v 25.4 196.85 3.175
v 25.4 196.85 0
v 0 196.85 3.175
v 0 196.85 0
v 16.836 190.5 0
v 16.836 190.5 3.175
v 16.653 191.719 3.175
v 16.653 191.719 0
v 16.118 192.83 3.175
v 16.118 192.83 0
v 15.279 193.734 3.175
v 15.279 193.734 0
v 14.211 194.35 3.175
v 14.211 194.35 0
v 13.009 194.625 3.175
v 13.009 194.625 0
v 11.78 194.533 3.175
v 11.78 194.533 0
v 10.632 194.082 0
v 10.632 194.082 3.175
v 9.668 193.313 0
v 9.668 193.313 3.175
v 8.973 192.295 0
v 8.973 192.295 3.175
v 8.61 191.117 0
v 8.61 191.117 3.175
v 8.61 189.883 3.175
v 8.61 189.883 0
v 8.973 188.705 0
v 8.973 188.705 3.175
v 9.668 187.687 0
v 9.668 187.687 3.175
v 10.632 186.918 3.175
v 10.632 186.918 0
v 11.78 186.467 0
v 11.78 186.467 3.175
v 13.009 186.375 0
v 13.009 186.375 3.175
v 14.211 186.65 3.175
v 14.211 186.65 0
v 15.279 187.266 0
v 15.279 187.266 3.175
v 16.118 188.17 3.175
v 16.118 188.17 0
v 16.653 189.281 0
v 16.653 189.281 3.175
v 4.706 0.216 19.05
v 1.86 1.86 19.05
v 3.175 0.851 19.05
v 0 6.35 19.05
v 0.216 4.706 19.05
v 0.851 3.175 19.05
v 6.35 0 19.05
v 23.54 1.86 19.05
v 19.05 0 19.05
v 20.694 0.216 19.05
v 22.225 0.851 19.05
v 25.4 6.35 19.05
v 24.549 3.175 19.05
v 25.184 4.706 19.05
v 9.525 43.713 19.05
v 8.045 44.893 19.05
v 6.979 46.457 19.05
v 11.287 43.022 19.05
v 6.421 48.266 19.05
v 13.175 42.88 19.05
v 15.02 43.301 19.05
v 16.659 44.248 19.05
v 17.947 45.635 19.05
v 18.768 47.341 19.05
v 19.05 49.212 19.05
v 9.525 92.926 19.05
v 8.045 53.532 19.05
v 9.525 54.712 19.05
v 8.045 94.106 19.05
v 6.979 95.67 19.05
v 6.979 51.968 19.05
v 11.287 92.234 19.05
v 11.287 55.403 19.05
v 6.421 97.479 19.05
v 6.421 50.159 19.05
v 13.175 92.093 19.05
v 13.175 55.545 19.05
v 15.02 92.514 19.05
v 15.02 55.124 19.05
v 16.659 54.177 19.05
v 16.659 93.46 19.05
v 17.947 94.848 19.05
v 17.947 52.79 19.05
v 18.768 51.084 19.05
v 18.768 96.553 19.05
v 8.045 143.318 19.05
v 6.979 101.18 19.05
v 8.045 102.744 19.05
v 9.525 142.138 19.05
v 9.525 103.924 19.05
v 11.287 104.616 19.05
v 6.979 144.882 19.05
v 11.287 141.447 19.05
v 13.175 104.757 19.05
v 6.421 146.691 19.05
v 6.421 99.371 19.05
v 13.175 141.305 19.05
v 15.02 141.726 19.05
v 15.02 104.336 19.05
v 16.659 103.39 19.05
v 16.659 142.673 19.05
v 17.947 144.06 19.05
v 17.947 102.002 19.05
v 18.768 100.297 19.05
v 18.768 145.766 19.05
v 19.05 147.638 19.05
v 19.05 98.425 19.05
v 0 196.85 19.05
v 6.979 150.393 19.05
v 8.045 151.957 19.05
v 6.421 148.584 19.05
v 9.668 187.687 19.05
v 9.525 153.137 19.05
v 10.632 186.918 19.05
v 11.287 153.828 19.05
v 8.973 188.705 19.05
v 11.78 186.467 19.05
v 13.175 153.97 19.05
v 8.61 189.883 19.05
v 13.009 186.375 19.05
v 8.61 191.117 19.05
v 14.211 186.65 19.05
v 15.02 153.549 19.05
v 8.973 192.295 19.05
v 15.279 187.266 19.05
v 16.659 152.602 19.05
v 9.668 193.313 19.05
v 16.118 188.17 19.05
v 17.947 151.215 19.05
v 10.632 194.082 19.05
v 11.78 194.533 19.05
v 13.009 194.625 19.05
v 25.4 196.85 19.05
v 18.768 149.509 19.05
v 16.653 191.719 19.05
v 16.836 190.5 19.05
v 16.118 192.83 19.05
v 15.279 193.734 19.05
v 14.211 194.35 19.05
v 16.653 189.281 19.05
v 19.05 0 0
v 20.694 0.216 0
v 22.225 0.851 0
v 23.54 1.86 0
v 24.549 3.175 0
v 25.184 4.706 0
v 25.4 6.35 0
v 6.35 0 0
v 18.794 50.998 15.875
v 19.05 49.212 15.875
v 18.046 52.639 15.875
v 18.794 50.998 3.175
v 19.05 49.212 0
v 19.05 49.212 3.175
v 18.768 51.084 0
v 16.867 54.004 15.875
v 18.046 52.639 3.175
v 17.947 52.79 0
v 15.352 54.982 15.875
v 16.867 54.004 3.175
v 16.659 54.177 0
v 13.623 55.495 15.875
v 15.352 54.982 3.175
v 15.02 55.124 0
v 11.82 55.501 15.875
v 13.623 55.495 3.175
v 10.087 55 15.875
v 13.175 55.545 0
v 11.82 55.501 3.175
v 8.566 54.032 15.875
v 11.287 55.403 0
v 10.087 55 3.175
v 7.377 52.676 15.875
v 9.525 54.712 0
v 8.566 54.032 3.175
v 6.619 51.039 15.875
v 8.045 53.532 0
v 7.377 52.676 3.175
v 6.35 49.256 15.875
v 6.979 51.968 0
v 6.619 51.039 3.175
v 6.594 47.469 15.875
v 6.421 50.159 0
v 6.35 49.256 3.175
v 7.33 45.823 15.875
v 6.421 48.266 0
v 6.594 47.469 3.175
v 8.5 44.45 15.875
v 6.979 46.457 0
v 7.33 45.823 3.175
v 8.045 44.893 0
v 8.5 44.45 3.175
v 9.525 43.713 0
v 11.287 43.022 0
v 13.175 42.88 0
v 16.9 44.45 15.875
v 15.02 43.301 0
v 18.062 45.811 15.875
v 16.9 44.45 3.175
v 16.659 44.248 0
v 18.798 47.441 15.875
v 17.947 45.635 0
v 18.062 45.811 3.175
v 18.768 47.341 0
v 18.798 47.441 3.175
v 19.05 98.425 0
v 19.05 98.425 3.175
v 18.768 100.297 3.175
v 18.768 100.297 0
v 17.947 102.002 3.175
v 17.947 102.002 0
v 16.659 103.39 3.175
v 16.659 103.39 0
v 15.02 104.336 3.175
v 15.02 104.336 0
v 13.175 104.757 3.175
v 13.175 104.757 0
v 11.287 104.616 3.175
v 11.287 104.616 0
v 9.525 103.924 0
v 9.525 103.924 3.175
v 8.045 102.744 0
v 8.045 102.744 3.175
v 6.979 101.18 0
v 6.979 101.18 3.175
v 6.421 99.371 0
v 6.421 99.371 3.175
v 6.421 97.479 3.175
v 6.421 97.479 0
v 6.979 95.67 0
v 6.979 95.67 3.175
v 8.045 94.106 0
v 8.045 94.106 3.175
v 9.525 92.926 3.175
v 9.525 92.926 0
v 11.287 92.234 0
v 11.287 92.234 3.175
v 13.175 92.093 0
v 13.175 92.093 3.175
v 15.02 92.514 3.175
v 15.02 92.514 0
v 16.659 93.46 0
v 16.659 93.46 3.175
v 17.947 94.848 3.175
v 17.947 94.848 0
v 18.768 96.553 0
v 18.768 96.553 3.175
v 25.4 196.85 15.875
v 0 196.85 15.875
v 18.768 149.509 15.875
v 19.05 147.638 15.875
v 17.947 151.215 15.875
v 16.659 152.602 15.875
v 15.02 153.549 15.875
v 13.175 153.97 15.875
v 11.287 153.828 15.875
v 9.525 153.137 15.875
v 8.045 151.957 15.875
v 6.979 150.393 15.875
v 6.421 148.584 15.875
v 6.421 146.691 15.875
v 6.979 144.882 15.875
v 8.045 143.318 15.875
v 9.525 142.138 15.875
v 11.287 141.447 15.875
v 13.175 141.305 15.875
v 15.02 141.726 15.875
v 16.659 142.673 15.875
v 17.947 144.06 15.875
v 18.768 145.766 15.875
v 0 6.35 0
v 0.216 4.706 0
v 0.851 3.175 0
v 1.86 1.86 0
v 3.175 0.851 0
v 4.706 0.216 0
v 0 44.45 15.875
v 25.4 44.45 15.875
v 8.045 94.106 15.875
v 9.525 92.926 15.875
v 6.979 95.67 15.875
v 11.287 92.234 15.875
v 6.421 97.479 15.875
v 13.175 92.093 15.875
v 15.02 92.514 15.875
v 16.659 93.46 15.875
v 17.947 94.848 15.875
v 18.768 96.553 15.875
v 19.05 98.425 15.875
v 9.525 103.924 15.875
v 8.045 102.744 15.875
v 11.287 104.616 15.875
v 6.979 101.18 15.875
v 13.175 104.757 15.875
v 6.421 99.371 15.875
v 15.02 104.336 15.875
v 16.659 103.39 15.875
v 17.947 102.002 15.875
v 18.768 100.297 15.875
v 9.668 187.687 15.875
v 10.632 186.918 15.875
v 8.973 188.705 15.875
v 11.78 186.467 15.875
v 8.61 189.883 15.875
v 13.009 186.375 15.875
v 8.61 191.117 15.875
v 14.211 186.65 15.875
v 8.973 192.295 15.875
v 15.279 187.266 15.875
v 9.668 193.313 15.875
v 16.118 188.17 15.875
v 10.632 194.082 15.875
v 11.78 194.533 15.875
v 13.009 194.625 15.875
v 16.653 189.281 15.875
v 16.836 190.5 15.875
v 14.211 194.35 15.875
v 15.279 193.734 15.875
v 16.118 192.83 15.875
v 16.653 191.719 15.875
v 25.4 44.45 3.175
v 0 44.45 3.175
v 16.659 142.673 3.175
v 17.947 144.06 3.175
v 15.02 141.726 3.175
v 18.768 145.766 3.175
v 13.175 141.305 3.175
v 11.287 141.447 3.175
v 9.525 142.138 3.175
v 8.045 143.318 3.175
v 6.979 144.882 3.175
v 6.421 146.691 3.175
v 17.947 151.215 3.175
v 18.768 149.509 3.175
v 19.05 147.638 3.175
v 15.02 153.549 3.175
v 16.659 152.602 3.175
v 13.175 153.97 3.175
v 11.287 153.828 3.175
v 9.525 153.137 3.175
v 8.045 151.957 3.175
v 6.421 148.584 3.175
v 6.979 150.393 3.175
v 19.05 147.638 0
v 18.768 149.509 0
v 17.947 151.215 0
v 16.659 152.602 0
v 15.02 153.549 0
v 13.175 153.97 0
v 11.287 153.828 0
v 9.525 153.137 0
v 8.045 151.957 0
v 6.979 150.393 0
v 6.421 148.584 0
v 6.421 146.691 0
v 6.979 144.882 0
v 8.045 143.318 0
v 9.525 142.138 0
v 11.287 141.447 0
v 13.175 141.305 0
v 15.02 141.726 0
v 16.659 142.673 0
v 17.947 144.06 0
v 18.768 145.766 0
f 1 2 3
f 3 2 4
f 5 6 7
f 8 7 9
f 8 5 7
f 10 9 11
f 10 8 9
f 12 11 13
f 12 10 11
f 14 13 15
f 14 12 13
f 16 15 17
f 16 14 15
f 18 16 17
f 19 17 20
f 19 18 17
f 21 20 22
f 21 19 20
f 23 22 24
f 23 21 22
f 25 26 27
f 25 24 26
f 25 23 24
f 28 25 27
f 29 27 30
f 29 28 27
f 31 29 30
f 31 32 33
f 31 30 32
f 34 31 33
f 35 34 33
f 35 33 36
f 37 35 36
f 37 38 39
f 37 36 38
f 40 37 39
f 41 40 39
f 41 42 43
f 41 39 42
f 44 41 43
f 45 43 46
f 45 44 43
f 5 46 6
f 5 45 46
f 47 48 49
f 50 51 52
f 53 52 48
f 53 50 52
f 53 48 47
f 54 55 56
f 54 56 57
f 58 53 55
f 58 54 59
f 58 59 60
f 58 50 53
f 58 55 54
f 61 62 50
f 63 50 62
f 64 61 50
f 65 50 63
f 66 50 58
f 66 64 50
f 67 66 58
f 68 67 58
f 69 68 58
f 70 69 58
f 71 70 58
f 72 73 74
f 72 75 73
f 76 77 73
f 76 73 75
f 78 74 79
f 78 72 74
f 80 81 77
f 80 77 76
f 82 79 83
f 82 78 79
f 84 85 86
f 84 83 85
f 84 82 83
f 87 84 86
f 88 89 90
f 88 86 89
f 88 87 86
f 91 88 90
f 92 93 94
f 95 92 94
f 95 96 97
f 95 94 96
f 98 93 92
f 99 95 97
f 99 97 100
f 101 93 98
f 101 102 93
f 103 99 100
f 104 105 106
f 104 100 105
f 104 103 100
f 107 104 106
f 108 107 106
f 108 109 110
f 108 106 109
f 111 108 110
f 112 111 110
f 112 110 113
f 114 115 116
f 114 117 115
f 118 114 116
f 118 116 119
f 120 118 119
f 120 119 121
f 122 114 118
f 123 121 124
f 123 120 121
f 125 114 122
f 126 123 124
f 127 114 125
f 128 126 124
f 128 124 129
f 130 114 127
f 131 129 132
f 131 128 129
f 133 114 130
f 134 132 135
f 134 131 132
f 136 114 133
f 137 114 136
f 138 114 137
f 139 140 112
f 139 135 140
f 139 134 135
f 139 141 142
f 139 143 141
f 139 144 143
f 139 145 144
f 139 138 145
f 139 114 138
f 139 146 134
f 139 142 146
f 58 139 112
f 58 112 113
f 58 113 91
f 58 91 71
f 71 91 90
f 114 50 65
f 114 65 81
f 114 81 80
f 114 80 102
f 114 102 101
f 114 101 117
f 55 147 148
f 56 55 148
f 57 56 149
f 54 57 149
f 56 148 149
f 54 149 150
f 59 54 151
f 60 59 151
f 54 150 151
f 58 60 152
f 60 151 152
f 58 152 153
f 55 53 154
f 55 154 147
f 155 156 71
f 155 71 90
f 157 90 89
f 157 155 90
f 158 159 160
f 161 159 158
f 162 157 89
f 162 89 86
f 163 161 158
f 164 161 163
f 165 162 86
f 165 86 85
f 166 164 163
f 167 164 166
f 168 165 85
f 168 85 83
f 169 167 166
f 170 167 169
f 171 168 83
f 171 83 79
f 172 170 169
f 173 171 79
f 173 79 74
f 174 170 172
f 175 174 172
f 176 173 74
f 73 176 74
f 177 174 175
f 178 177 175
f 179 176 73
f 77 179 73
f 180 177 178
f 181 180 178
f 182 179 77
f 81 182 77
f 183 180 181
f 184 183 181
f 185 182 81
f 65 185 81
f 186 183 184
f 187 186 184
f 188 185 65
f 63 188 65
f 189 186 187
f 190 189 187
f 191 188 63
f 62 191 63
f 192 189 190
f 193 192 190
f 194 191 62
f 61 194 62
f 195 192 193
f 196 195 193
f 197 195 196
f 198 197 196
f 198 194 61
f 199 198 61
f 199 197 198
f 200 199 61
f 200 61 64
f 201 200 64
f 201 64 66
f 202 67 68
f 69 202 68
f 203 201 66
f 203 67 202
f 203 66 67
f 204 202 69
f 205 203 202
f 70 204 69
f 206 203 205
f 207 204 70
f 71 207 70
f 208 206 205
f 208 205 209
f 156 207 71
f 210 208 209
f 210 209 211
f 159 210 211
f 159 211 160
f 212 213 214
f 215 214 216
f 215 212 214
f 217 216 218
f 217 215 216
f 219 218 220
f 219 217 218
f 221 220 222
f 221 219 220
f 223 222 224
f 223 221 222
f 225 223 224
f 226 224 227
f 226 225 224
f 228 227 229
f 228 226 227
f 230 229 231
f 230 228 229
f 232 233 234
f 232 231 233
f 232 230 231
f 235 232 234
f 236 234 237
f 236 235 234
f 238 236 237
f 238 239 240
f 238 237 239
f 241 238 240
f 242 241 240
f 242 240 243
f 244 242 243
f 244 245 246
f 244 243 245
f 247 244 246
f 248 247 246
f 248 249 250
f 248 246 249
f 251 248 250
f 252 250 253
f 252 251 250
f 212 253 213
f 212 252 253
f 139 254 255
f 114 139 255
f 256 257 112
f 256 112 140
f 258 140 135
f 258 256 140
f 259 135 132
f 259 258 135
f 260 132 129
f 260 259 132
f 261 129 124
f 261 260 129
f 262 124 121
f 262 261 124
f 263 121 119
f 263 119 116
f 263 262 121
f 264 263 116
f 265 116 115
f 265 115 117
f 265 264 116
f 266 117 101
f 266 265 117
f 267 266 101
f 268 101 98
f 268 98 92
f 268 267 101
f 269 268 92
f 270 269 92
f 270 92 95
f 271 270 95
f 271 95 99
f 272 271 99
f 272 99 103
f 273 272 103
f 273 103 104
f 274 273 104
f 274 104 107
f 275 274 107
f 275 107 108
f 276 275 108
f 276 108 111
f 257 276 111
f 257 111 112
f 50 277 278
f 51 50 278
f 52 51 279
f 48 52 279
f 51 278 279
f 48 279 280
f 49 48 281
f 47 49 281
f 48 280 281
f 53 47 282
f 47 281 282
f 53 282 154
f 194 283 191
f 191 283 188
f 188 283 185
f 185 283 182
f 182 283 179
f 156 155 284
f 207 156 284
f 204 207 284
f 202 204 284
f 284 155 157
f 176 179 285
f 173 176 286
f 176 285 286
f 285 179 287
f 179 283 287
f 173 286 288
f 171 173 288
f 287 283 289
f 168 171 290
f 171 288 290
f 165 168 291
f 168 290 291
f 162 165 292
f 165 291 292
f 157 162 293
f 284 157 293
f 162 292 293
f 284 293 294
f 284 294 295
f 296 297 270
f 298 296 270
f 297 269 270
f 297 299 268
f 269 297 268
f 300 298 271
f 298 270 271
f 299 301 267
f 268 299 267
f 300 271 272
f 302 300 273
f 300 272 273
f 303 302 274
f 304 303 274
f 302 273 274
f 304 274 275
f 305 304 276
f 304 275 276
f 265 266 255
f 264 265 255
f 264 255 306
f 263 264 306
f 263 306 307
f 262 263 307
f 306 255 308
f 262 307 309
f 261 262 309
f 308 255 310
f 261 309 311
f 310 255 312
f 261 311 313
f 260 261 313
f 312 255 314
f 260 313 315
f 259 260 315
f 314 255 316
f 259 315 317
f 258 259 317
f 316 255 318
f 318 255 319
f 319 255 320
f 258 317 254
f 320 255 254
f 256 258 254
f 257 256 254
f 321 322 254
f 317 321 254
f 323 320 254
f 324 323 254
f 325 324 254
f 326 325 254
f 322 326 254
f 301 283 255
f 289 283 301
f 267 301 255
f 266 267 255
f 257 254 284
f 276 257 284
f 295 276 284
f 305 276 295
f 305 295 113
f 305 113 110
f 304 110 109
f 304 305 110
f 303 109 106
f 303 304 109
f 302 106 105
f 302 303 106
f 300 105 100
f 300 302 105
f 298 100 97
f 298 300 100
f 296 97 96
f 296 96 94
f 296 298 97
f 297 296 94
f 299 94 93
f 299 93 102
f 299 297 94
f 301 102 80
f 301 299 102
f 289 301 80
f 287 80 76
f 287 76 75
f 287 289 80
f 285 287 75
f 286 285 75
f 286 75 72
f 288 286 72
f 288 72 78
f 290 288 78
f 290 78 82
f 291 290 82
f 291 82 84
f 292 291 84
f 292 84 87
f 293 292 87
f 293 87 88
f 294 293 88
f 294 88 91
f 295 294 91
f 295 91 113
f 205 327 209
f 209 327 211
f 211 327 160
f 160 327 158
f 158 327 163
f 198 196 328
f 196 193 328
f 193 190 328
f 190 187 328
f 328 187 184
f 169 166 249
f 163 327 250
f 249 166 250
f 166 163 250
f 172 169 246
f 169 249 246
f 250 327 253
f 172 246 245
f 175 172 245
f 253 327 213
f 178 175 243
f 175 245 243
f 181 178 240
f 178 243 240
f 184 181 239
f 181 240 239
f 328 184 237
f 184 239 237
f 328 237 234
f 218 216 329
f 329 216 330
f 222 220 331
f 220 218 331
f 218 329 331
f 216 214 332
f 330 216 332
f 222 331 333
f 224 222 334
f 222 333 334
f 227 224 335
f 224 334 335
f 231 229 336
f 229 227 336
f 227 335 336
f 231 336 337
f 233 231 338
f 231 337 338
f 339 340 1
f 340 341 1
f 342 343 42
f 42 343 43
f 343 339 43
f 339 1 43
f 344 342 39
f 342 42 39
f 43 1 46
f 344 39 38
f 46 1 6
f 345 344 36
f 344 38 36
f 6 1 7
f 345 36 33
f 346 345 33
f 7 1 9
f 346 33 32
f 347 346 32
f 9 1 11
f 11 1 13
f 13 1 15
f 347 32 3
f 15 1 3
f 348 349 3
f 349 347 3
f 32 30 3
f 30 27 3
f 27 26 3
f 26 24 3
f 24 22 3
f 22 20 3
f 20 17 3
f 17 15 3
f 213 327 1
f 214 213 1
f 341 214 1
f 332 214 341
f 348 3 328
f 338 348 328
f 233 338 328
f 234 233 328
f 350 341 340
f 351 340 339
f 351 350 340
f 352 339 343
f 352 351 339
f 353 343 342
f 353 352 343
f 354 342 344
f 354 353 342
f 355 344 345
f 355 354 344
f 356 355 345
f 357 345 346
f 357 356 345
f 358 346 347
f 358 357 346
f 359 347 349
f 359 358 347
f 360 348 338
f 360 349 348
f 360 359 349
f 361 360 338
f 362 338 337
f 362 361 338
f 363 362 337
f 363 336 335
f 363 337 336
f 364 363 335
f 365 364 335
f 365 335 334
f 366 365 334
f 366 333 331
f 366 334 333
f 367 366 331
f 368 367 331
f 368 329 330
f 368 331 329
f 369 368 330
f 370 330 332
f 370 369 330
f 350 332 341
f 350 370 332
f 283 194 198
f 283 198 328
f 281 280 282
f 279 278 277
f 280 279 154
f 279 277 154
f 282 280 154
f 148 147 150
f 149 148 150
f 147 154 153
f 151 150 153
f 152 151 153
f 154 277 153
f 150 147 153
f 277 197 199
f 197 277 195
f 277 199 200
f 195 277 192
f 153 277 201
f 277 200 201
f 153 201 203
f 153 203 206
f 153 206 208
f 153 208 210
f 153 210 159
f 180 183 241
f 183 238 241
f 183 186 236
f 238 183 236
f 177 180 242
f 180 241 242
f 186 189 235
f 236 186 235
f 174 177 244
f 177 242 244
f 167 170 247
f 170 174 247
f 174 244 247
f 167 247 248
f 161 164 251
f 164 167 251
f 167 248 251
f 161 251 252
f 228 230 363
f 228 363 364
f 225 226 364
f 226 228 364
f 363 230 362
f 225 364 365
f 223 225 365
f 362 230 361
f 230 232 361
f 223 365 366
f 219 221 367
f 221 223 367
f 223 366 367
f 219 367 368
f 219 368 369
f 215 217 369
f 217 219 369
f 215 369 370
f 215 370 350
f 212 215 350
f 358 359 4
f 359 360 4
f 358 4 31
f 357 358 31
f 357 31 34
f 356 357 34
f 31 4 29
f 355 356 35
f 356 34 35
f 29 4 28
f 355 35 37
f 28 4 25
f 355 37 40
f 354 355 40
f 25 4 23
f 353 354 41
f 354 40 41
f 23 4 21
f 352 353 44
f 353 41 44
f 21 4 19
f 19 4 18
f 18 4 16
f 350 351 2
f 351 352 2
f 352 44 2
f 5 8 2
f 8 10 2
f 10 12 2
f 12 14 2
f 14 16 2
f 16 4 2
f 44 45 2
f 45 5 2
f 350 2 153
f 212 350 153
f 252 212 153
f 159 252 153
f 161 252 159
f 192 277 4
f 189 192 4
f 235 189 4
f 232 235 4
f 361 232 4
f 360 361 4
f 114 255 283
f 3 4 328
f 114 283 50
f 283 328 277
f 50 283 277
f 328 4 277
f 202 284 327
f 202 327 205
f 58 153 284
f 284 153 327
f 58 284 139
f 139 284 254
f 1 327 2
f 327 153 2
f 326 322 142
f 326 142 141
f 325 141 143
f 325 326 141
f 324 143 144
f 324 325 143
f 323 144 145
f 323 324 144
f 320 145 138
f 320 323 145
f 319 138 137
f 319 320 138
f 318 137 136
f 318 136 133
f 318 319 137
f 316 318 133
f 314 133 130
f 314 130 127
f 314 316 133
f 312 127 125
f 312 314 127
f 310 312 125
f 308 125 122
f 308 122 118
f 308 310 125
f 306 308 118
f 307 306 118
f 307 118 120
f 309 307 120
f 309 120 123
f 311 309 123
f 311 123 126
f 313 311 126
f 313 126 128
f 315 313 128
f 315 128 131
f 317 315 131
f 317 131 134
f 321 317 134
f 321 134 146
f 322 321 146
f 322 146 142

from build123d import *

# Parameters (mm, degrees)
F0_R     = 6.35
F0_R_2   = 4.136422
F1_DEPTH = 19.05
F2_W     = 12.7
F2_H     = 12.7
F3_DEPTH = 152.4


with BuildPart() as f1:
    # F0 (on Top) → F1 (new body)
    with BuildSketch(Plane.XY):
        with BuildLine():
            Line((25.4, 6.35), (25.4, 196.85))
            Line((25.4, 196.85), (6.35, 196.85))
            Line((6.35, 196.85), (0, 196.85))
            Line((0, 196.85), (0, 190.5))
            Line((0, 190.5), (0, 98.425))
            Line((0, 98.425), (0, 6.35))
            ThreePointArc((0, 6.35), (1.859872, 1.859872), (6.35, 0))
            Line((6.35, 0), (19.05, 0))
            ThreePointArc((19.05, 0), (23.540128, 1.859872), (25.4, 6.35))
        make_face()
        with Locations((12.7, 49.2125)):
            Circle(F0_R, mode=Mode.SUBTRACT)
        with Locations((12.7, 98.425)):
            Circle(F0_R, mode=Mode.SUBTRACT)
        with Locations((12.7, 147.6375)):
            Circle(F0_R, mode=Mode.SUBTRACT)
        with Locations((12.7, 190.5)):
            Circle(F0_R_2, mode=Mode.SUBTRACT)
    extrude(amount=F1_DEPTH)

    # F2 (on face) → F3 (cut)
    with BuildSketch(Plane(origin=(0, 196.85, 0), x_dir=(-1, 0, 0), z_dir=(0, 1, 0))):
        with Locations((-19.05, 9.525)):
            Rectangle(F2_W, F2_H)
        with Locations((-6.35, 9.525)):
            Rectangle(F2_W, F2_H)
    extrude(amount=-F3_DEPTH, mode=Mode.SUBTRACT)


solid = f1.part
